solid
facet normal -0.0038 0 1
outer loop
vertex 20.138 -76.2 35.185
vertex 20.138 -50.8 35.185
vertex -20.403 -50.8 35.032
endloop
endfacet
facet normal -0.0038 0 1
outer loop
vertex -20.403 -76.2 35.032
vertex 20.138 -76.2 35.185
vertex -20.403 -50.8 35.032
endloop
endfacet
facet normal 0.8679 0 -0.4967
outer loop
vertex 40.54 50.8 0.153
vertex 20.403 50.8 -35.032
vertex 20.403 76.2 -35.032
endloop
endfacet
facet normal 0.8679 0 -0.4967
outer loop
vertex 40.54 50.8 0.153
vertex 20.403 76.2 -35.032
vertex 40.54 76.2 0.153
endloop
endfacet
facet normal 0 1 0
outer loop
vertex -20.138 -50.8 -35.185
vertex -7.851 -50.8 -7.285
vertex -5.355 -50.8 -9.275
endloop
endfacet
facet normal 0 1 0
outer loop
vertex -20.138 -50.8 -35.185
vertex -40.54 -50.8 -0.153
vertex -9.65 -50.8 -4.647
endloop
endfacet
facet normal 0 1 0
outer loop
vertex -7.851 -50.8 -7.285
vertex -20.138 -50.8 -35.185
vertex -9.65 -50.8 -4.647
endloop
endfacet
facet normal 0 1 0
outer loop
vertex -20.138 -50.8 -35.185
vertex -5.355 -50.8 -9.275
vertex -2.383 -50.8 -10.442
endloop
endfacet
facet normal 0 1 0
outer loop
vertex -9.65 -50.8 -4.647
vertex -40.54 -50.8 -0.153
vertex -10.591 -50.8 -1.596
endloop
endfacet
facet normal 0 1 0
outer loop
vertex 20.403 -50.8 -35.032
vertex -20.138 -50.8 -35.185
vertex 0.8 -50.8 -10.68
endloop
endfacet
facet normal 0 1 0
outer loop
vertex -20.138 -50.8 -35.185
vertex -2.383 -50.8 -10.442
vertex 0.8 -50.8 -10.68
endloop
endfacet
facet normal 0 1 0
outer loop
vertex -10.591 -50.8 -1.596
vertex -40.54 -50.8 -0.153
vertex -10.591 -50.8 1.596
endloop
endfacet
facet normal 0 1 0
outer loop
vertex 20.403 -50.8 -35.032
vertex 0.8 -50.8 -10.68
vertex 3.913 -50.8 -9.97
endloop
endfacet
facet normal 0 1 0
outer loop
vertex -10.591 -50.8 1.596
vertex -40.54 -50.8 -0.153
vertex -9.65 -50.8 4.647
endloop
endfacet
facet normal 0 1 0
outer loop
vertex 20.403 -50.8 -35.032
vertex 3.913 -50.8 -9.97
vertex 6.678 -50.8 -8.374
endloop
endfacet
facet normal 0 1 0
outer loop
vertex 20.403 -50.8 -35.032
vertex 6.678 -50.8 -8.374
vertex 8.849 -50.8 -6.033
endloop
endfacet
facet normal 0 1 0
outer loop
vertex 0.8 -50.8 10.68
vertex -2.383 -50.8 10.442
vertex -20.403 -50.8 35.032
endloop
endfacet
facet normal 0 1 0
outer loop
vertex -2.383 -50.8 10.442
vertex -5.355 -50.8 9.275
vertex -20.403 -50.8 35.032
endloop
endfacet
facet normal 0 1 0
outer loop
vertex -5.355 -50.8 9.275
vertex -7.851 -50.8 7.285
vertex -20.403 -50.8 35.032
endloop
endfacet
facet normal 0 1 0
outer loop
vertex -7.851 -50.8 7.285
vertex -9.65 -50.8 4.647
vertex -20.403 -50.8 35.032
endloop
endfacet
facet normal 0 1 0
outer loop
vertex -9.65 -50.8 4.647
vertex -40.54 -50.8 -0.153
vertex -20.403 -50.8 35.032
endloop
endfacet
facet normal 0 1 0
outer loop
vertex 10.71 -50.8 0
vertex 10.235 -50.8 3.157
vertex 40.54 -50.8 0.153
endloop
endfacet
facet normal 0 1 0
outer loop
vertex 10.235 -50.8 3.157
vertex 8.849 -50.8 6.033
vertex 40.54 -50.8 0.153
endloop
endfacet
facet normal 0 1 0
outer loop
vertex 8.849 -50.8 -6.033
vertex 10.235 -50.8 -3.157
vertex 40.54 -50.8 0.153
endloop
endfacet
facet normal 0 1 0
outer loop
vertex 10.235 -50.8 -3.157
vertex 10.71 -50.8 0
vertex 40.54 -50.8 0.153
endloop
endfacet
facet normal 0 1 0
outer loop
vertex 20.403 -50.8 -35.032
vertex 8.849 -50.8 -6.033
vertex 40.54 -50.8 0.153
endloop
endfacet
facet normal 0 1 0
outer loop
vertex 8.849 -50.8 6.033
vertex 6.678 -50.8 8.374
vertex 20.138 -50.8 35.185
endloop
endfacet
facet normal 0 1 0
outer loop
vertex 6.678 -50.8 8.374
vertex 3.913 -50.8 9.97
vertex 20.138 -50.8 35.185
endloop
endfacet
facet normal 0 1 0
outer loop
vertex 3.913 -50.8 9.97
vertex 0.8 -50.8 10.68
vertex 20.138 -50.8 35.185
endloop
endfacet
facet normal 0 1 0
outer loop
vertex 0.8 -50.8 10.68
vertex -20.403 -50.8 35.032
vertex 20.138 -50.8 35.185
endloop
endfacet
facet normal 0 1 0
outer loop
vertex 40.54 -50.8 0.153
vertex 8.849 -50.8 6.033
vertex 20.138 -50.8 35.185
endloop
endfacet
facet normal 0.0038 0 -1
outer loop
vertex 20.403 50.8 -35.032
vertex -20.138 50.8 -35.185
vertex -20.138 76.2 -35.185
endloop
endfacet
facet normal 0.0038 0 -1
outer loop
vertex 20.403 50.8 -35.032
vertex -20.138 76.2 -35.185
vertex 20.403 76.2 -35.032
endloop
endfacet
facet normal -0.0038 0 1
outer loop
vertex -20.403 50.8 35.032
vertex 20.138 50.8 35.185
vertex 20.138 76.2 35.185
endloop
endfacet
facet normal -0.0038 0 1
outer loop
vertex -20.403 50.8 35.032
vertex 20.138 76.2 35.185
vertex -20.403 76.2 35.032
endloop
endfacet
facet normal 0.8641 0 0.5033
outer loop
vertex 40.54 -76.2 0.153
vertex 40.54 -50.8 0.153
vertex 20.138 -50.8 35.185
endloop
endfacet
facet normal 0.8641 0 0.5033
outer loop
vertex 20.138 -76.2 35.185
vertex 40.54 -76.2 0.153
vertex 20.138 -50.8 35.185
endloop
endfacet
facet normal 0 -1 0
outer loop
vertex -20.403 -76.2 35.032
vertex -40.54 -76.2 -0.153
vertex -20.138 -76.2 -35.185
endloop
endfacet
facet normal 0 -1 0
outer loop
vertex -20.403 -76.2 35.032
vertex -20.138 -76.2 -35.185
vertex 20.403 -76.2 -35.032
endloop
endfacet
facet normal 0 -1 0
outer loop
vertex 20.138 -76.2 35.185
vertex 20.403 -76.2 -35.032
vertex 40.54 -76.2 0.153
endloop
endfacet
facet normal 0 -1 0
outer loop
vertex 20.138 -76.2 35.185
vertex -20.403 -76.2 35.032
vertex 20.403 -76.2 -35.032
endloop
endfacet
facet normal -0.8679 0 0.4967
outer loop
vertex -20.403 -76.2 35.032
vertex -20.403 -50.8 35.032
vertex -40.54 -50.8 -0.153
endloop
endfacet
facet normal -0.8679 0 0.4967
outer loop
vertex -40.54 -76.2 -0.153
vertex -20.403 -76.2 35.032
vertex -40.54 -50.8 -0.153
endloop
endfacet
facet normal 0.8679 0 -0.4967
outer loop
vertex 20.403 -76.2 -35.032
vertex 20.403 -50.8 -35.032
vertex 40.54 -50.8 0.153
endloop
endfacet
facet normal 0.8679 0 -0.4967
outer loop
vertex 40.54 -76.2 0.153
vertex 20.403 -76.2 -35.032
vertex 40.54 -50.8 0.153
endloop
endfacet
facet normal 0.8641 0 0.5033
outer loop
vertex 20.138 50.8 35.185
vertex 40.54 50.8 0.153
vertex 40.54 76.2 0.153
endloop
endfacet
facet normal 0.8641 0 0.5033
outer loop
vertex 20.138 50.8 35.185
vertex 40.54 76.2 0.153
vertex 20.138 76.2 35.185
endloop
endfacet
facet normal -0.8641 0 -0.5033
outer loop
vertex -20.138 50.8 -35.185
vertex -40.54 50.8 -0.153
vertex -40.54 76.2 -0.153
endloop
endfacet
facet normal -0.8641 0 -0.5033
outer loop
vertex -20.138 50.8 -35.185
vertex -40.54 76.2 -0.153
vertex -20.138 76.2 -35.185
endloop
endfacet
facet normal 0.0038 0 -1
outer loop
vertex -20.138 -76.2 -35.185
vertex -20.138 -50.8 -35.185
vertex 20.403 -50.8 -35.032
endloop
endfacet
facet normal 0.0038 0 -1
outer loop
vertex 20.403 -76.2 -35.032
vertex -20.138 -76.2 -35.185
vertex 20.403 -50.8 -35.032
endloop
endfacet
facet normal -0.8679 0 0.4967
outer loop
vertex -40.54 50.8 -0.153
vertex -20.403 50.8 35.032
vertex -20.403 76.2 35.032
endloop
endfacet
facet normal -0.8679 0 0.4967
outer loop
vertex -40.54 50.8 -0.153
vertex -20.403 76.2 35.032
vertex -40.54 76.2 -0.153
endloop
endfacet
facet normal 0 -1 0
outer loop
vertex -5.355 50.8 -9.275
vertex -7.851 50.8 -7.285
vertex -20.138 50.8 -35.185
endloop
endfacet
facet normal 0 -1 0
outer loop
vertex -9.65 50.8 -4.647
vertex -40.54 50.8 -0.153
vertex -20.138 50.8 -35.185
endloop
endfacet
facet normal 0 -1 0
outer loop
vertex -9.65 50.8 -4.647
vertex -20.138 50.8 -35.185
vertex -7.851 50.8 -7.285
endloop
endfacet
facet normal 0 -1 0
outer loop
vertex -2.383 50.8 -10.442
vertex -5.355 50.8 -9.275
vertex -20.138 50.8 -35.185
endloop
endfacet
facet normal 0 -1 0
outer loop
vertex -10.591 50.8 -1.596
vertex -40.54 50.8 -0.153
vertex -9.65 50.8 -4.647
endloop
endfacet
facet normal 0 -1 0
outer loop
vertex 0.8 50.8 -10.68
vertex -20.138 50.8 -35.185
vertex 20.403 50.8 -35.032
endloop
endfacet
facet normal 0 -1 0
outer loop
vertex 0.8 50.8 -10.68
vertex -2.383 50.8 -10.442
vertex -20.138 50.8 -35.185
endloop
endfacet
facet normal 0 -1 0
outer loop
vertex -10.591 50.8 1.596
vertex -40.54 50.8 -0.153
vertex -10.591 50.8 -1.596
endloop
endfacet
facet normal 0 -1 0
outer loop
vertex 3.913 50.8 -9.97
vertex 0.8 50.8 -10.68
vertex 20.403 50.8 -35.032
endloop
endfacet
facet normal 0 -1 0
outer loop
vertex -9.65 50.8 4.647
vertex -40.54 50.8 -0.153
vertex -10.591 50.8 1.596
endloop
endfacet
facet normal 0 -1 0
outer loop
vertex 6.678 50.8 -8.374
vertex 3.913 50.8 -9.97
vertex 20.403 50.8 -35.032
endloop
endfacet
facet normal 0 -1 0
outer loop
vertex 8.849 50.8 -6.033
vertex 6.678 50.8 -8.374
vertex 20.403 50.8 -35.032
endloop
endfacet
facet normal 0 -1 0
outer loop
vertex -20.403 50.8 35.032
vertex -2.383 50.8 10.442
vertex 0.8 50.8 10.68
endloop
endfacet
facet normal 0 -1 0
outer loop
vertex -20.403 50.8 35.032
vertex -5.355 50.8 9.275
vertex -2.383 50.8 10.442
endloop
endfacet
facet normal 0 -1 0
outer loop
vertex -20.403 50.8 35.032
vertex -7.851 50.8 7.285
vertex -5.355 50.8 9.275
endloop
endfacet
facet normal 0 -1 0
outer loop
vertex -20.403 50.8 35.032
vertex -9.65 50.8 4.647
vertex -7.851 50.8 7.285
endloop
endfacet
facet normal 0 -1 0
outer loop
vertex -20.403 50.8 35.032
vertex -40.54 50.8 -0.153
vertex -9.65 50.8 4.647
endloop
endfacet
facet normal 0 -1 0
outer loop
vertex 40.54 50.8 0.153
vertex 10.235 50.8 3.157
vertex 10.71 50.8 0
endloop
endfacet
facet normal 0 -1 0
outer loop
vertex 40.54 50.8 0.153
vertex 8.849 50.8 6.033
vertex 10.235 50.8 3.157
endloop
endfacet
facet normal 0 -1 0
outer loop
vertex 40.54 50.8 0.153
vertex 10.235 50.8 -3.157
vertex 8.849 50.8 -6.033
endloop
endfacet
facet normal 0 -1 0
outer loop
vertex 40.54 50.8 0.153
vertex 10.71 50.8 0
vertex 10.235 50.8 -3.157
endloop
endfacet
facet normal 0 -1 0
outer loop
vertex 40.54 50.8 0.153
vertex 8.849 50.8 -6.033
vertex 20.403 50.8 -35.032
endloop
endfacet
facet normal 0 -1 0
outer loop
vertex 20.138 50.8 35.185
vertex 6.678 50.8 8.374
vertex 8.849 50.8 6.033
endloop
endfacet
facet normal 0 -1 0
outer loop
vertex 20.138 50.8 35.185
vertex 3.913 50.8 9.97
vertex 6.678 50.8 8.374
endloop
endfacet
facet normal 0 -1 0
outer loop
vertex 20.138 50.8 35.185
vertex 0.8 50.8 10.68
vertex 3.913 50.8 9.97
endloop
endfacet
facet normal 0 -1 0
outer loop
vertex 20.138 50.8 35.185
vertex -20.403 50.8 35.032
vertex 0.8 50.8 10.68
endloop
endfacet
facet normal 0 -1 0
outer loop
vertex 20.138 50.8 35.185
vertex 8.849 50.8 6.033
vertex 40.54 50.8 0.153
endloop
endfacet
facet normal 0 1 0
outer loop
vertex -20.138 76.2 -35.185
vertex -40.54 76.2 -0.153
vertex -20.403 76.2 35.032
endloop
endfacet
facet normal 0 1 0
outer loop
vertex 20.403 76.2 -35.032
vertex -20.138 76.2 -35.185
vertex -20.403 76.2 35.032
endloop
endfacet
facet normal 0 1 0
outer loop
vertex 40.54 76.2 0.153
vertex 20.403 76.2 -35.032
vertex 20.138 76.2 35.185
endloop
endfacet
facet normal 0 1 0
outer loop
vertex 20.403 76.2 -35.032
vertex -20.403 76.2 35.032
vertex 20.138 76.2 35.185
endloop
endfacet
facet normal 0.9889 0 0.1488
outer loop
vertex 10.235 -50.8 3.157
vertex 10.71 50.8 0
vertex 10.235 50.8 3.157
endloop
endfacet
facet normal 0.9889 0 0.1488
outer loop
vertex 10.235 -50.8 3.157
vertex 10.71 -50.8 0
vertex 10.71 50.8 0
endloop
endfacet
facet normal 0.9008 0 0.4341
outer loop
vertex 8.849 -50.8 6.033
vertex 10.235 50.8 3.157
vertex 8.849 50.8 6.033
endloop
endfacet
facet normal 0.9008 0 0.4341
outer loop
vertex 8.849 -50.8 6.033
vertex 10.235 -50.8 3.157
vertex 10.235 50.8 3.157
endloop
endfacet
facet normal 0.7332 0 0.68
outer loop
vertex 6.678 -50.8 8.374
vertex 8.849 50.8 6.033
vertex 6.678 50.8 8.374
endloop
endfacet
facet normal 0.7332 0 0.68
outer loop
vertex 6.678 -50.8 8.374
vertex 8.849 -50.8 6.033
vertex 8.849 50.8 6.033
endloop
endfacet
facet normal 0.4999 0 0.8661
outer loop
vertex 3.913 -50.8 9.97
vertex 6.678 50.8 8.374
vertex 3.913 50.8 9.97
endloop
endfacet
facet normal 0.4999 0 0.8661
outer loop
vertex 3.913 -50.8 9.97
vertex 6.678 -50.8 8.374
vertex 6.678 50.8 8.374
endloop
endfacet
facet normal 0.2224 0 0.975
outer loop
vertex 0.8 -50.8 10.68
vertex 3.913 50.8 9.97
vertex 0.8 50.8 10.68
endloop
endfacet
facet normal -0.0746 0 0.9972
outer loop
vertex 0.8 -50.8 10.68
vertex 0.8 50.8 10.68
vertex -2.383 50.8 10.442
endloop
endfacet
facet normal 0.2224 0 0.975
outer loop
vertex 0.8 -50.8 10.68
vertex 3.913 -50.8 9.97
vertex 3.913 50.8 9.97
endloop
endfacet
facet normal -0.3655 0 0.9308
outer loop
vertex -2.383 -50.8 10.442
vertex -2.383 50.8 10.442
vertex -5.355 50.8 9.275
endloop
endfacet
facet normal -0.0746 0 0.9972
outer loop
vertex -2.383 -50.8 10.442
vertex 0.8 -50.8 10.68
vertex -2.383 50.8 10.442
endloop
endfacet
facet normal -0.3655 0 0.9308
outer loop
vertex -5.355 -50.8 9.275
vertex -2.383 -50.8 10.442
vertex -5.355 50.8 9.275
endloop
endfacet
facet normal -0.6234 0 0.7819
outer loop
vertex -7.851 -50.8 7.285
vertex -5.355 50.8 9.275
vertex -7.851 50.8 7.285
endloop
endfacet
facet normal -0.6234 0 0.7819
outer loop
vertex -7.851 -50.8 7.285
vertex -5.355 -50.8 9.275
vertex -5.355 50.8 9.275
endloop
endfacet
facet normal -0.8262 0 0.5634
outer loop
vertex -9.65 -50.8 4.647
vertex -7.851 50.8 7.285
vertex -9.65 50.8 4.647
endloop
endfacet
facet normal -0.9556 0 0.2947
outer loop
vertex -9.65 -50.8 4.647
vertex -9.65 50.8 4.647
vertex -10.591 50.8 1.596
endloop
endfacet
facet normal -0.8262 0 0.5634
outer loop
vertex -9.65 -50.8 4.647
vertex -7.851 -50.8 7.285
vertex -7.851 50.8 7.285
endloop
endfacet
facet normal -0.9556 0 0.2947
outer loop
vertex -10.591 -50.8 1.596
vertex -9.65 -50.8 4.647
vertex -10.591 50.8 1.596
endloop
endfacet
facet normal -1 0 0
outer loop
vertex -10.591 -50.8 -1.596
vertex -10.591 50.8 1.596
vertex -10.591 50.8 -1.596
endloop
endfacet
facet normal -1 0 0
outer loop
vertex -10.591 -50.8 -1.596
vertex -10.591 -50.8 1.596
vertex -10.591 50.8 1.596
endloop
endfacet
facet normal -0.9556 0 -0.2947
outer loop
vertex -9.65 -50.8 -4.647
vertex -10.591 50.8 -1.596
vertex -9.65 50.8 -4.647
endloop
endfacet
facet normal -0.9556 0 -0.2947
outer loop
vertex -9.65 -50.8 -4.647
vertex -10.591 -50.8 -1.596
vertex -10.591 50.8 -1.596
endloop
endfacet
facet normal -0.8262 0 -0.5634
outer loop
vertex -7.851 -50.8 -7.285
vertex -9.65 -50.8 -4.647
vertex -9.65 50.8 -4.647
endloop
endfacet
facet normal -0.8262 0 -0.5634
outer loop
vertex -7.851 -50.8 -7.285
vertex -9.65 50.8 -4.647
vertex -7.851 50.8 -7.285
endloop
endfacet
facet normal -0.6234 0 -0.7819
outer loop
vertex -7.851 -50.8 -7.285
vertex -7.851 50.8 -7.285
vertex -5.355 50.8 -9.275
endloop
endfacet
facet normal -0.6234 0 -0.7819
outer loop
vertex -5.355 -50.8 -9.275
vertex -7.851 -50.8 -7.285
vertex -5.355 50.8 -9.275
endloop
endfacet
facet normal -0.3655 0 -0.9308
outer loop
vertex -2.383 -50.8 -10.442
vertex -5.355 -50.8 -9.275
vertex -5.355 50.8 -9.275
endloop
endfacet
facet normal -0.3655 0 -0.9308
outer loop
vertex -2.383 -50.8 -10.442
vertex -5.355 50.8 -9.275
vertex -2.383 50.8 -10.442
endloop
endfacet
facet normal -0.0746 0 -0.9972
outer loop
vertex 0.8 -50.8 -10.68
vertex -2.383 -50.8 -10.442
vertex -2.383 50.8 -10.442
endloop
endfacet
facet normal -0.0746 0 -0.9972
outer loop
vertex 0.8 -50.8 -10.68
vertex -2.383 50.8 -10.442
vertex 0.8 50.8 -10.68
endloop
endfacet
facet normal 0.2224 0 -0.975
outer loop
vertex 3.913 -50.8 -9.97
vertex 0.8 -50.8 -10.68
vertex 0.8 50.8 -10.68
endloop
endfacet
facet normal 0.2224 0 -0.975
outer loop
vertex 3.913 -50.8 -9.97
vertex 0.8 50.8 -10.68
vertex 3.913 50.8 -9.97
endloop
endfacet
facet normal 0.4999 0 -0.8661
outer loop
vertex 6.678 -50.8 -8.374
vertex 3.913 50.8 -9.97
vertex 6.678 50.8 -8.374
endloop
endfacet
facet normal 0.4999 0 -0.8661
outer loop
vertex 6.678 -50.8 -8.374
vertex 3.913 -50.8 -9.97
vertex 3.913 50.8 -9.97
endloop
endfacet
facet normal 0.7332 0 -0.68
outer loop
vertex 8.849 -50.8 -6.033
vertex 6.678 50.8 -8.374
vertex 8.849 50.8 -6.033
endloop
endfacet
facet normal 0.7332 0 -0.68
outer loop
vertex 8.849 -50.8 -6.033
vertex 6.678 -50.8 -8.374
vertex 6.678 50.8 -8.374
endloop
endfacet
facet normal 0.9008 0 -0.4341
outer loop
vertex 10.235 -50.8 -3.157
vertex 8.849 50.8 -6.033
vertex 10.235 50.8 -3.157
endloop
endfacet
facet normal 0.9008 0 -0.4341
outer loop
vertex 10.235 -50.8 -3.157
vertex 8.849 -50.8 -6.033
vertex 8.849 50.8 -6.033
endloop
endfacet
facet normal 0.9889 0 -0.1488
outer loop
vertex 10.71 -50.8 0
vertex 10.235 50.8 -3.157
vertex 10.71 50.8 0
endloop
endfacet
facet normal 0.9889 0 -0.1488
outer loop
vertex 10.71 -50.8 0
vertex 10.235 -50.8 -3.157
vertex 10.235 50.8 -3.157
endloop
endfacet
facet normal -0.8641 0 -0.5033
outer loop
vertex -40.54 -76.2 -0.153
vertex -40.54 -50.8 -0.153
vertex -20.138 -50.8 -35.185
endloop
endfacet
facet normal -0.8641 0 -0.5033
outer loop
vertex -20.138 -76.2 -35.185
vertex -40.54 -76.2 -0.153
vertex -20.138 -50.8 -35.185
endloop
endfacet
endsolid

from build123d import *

# Parameters (mm, degrees)
F0_R     = 10.71035
F1_DEPTH = 50.8
F3_DEPTH = 25.4


with BuildPart() as f1:
    # F0 (on Front) → F1 (new body)
    with BuildSketch(Plane.XZ):
        Circle(F0_R)
    extrude(amount=F1_DEPTH)

    # F2 (on face) → F3 (join)
    with BuildSketch(Plane.XZ.offset(50.8)):
        Polygon((20.402551, -35.032415), (40.540237, 0.15292), (20.137686, 35.185335), (-20.402551, 35.032415), (-40.540237, -0.15292), (-20.137686, -35.185335), align=None)
    extrude(amount=F3_DEPTH)

    # F4: F1 across plane


with BuildPart() as f1_1:
    add(f1.part)
    add(f1.part.mirror(Plane.XZ))


solid = f1_1.part
